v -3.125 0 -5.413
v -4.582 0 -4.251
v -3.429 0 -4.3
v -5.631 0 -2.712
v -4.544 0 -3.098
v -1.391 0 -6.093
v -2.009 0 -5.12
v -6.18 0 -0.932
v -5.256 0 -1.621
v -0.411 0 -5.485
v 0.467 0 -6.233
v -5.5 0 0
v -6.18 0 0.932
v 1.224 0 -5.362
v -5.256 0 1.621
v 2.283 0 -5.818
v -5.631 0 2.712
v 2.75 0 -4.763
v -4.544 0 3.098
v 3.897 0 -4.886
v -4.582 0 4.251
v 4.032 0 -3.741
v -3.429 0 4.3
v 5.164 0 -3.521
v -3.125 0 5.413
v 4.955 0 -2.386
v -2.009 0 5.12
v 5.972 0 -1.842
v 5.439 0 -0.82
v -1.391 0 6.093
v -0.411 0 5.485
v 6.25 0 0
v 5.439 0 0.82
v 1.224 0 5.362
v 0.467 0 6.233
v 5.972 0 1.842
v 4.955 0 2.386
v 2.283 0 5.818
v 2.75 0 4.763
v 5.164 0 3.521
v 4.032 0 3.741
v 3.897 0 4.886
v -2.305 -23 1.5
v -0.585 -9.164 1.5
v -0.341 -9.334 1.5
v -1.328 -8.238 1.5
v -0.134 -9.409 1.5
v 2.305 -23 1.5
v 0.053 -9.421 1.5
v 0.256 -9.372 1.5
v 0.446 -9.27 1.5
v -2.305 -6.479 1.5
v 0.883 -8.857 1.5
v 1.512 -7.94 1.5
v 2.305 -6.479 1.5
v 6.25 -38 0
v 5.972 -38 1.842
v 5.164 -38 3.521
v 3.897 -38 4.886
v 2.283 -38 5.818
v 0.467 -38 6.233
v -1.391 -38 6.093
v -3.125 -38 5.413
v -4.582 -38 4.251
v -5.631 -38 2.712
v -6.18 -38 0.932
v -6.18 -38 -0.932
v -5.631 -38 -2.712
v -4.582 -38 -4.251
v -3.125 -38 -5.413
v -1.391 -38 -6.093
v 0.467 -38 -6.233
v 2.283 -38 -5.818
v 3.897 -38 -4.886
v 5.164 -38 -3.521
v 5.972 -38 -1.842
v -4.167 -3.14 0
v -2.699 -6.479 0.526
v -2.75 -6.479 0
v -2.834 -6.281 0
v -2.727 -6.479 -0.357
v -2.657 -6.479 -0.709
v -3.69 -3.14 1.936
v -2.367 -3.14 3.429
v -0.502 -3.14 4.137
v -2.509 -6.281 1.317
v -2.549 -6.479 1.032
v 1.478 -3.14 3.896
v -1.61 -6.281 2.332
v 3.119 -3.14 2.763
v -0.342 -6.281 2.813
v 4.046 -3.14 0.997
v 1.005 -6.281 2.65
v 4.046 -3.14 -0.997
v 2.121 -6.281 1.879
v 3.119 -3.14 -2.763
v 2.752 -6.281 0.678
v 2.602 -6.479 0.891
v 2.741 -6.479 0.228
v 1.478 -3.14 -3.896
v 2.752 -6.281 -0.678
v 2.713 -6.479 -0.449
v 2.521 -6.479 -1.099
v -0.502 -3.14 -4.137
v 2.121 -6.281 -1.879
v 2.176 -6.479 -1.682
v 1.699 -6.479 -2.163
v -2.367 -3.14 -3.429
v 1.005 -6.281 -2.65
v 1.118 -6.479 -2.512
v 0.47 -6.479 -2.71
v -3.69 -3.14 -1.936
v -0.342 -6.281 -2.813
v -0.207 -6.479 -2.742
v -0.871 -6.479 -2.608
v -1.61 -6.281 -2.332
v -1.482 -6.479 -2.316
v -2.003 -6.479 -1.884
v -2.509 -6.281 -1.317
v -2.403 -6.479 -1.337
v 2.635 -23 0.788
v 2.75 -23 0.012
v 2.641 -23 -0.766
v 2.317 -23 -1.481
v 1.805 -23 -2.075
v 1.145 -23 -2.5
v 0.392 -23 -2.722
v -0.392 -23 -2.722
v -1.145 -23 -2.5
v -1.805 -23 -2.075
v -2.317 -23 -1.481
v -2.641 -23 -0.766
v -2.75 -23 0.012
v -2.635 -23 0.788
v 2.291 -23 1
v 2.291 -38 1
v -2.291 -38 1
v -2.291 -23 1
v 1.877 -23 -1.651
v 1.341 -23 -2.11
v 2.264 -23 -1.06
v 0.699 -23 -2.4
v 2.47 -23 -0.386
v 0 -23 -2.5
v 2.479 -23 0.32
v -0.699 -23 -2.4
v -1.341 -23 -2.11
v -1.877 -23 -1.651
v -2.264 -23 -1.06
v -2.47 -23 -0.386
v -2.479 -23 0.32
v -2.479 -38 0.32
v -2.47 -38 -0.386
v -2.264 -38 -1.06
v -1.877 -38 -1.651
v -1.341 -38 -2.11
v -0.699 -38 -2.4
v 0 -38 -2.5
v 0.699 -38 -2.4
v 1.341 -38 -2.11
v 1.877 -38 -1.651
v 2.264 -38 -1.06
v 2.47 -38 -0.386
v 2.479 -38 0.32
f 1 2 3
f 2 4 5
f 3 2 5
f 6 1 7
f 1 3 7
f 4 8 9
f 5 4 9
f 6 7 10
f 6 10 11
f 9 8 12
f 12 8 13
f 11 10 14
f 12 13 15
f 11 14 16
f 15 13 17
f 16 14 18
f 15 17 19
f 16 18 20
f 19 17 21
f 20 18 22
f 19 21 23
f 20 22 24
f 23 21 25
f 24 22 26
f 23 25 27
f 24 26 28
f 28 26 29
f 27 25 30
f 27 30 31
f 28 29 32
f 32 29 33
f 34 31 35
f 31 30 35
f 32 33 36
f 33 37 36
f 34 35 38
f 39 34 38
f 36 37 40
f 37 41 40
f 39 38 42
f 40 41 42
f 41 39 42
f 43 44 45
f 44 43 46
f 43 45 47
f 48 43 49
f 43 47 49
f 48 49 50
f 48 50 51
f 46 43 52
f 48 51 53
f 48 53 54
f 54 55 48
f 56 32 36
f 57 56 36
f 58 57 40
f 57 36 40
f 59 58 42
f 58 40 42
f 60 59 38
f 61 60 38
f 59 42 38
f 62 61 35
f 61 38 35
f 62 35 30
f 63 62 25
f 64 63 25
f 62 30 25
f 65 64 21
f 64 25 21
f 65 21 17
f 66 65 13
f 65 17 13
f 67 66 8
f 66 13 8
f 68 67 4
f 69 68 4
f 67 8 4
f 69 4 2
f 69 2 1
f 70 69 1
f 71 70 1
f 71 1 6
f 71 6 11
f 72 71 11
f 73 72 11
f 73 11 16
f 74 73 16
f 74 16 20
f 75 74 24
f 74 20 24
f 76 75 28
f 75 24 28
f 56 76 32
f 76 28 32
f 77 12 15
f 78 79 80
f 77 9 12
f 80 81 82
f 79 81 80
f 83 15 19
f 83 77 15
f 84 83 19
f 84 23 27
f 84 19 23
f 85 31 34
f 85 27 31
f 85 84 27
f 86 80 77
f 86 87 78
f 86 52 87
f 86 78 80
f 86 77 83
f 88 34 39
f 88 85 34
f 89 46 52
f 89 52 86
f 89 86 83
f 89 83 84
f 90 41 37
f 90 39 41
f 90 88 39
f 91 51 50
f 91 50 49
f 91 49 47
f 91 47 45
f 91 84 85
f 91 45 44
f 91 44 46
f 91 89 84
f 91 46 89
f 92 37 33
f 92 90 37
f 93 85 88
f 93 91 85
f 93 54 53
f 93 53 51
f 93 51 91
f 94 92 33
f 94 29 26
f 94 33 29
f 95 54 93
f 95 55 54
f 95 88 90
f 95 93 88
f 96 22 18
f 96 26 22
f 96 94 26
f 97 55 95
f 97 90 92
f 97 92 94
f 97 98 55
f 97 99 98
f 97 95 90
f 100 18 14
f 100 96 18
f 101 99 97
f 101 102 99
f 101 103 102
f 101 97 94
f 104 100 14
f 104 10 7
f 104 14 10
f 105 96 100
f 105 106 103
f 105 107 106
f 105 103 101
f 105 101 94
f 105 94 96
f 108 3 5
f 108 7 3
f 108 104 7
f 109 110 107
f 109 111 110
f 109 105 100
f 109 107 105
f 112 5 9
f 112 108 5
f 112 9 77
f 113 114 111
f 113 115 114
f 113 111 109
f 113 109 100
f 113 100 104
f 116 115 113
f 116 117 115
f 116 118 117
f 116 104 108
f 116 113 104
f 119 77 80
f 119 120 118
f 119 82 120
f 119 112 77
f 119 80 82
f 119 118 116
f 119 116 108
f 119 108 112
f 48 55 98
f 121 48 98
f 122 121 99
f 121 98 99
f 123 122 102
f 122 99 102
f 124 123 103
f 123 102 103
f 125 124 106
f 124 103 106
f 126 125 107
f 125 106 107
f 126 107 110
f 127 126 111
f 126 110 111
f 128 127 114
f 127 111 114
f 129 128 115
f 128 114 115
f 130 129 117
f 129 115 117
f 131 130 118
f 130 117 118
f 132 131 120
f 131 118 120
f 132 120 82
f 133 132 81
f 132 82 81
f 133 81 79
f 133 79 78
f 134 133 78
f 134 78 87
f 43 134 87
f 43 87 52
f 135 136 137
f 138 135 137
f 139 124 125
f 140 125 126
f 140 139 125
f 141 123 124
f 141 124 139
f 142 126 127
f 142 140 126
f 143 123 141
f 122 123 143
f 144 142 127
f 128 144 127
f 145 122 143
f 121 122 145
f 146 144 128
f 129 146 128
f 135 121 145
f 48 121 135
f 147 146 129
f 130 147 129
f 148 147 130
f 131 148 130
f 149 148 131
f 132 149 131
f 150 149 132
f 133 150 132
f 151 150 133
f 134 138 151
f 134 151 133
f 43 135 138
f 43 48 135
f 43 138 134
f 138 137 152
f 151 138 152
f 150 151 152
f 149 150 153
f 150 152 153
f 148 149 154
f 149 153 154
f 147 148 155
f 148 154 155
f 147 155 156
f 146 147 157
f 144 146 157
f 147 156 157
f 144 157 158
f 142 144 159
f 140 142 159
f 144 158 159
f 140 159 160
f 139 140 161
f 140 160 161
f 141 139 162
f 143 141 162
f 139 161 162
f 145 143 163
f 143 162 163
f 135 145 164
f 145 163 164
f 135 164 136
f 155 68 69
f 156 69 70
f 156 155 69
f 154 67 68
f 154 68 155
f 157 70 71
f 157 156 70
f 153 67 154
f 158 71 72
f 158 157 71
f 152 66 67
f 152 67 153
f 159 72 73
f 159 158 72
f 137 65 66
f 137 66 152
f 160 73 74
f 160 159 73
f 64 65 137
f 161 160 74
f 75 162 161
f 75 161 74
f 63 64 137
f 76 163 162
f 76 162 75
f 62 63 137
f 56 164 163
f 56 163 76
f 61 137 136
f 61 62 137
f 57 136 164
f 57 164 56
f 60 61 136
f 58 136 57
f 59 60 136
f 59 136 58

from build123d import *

# Parameters (mm, degrees)
F0_R     = 6.25
F1_DEPTH = 38
F3_DEPTH = 15
F5_DEPTH = 23
F6_R     = 5.5
F7_DEPTH = 10
F7_TAPER = 23


with BuildPart() as f1:
    # F0 (on Front) → F1 (new body)
    with BuildSketch(Plane.XZ):
        Circle(F0_R)
    extrude(amount=F1_DEPTH)

    # F2 (on face) → F3 (cut)
    with BuildSketch(Plane.XZ.offset(38)):
        with BuildLine():
            Line((0, 1), (-2.2912878475, 1))
            ThreePointArc((-2.2912878475, 1), (0, -2.5), (2.2912878475, 1))
            Line((2.2912878475, 1), (0, 1))
        make_face()
    extrude(amount=-F3_DEPTH, mode=Mode.SUBTRACT)

    # F4 (on face) → F5 (cut)
    with BuildSketch(Plane(origin=(0, 0, 0), x_dir=(-1, 0, 0), z_dir=(0, 1, 0))):
        with BuildLine():
            Line((0, 1.5), (-2.3048861143, 1.5))
            ThreePointArc((-2.3048861143, 1.5), (0, -2.75), (2.3048861143, 1.5))
            Line((2.3048861143, 1.5), (0, 1.5))
        make_face()
    extrude(amount=-F5_DEPTH, mode=Mode.SUBTRACT)

    # F6 (on face) → F7 (cut)
    with BuildSketch(Plane(origin=(0, 0, 0), x_dir=(-1, 0, 0), z_dir=(0, 1, 0))):
        Circle(F6_R)
    extrude(amount=-F7_DEPTH, taper=F7_TAPER, mode=Mode.SUBTRACT)


solid = f1.part
